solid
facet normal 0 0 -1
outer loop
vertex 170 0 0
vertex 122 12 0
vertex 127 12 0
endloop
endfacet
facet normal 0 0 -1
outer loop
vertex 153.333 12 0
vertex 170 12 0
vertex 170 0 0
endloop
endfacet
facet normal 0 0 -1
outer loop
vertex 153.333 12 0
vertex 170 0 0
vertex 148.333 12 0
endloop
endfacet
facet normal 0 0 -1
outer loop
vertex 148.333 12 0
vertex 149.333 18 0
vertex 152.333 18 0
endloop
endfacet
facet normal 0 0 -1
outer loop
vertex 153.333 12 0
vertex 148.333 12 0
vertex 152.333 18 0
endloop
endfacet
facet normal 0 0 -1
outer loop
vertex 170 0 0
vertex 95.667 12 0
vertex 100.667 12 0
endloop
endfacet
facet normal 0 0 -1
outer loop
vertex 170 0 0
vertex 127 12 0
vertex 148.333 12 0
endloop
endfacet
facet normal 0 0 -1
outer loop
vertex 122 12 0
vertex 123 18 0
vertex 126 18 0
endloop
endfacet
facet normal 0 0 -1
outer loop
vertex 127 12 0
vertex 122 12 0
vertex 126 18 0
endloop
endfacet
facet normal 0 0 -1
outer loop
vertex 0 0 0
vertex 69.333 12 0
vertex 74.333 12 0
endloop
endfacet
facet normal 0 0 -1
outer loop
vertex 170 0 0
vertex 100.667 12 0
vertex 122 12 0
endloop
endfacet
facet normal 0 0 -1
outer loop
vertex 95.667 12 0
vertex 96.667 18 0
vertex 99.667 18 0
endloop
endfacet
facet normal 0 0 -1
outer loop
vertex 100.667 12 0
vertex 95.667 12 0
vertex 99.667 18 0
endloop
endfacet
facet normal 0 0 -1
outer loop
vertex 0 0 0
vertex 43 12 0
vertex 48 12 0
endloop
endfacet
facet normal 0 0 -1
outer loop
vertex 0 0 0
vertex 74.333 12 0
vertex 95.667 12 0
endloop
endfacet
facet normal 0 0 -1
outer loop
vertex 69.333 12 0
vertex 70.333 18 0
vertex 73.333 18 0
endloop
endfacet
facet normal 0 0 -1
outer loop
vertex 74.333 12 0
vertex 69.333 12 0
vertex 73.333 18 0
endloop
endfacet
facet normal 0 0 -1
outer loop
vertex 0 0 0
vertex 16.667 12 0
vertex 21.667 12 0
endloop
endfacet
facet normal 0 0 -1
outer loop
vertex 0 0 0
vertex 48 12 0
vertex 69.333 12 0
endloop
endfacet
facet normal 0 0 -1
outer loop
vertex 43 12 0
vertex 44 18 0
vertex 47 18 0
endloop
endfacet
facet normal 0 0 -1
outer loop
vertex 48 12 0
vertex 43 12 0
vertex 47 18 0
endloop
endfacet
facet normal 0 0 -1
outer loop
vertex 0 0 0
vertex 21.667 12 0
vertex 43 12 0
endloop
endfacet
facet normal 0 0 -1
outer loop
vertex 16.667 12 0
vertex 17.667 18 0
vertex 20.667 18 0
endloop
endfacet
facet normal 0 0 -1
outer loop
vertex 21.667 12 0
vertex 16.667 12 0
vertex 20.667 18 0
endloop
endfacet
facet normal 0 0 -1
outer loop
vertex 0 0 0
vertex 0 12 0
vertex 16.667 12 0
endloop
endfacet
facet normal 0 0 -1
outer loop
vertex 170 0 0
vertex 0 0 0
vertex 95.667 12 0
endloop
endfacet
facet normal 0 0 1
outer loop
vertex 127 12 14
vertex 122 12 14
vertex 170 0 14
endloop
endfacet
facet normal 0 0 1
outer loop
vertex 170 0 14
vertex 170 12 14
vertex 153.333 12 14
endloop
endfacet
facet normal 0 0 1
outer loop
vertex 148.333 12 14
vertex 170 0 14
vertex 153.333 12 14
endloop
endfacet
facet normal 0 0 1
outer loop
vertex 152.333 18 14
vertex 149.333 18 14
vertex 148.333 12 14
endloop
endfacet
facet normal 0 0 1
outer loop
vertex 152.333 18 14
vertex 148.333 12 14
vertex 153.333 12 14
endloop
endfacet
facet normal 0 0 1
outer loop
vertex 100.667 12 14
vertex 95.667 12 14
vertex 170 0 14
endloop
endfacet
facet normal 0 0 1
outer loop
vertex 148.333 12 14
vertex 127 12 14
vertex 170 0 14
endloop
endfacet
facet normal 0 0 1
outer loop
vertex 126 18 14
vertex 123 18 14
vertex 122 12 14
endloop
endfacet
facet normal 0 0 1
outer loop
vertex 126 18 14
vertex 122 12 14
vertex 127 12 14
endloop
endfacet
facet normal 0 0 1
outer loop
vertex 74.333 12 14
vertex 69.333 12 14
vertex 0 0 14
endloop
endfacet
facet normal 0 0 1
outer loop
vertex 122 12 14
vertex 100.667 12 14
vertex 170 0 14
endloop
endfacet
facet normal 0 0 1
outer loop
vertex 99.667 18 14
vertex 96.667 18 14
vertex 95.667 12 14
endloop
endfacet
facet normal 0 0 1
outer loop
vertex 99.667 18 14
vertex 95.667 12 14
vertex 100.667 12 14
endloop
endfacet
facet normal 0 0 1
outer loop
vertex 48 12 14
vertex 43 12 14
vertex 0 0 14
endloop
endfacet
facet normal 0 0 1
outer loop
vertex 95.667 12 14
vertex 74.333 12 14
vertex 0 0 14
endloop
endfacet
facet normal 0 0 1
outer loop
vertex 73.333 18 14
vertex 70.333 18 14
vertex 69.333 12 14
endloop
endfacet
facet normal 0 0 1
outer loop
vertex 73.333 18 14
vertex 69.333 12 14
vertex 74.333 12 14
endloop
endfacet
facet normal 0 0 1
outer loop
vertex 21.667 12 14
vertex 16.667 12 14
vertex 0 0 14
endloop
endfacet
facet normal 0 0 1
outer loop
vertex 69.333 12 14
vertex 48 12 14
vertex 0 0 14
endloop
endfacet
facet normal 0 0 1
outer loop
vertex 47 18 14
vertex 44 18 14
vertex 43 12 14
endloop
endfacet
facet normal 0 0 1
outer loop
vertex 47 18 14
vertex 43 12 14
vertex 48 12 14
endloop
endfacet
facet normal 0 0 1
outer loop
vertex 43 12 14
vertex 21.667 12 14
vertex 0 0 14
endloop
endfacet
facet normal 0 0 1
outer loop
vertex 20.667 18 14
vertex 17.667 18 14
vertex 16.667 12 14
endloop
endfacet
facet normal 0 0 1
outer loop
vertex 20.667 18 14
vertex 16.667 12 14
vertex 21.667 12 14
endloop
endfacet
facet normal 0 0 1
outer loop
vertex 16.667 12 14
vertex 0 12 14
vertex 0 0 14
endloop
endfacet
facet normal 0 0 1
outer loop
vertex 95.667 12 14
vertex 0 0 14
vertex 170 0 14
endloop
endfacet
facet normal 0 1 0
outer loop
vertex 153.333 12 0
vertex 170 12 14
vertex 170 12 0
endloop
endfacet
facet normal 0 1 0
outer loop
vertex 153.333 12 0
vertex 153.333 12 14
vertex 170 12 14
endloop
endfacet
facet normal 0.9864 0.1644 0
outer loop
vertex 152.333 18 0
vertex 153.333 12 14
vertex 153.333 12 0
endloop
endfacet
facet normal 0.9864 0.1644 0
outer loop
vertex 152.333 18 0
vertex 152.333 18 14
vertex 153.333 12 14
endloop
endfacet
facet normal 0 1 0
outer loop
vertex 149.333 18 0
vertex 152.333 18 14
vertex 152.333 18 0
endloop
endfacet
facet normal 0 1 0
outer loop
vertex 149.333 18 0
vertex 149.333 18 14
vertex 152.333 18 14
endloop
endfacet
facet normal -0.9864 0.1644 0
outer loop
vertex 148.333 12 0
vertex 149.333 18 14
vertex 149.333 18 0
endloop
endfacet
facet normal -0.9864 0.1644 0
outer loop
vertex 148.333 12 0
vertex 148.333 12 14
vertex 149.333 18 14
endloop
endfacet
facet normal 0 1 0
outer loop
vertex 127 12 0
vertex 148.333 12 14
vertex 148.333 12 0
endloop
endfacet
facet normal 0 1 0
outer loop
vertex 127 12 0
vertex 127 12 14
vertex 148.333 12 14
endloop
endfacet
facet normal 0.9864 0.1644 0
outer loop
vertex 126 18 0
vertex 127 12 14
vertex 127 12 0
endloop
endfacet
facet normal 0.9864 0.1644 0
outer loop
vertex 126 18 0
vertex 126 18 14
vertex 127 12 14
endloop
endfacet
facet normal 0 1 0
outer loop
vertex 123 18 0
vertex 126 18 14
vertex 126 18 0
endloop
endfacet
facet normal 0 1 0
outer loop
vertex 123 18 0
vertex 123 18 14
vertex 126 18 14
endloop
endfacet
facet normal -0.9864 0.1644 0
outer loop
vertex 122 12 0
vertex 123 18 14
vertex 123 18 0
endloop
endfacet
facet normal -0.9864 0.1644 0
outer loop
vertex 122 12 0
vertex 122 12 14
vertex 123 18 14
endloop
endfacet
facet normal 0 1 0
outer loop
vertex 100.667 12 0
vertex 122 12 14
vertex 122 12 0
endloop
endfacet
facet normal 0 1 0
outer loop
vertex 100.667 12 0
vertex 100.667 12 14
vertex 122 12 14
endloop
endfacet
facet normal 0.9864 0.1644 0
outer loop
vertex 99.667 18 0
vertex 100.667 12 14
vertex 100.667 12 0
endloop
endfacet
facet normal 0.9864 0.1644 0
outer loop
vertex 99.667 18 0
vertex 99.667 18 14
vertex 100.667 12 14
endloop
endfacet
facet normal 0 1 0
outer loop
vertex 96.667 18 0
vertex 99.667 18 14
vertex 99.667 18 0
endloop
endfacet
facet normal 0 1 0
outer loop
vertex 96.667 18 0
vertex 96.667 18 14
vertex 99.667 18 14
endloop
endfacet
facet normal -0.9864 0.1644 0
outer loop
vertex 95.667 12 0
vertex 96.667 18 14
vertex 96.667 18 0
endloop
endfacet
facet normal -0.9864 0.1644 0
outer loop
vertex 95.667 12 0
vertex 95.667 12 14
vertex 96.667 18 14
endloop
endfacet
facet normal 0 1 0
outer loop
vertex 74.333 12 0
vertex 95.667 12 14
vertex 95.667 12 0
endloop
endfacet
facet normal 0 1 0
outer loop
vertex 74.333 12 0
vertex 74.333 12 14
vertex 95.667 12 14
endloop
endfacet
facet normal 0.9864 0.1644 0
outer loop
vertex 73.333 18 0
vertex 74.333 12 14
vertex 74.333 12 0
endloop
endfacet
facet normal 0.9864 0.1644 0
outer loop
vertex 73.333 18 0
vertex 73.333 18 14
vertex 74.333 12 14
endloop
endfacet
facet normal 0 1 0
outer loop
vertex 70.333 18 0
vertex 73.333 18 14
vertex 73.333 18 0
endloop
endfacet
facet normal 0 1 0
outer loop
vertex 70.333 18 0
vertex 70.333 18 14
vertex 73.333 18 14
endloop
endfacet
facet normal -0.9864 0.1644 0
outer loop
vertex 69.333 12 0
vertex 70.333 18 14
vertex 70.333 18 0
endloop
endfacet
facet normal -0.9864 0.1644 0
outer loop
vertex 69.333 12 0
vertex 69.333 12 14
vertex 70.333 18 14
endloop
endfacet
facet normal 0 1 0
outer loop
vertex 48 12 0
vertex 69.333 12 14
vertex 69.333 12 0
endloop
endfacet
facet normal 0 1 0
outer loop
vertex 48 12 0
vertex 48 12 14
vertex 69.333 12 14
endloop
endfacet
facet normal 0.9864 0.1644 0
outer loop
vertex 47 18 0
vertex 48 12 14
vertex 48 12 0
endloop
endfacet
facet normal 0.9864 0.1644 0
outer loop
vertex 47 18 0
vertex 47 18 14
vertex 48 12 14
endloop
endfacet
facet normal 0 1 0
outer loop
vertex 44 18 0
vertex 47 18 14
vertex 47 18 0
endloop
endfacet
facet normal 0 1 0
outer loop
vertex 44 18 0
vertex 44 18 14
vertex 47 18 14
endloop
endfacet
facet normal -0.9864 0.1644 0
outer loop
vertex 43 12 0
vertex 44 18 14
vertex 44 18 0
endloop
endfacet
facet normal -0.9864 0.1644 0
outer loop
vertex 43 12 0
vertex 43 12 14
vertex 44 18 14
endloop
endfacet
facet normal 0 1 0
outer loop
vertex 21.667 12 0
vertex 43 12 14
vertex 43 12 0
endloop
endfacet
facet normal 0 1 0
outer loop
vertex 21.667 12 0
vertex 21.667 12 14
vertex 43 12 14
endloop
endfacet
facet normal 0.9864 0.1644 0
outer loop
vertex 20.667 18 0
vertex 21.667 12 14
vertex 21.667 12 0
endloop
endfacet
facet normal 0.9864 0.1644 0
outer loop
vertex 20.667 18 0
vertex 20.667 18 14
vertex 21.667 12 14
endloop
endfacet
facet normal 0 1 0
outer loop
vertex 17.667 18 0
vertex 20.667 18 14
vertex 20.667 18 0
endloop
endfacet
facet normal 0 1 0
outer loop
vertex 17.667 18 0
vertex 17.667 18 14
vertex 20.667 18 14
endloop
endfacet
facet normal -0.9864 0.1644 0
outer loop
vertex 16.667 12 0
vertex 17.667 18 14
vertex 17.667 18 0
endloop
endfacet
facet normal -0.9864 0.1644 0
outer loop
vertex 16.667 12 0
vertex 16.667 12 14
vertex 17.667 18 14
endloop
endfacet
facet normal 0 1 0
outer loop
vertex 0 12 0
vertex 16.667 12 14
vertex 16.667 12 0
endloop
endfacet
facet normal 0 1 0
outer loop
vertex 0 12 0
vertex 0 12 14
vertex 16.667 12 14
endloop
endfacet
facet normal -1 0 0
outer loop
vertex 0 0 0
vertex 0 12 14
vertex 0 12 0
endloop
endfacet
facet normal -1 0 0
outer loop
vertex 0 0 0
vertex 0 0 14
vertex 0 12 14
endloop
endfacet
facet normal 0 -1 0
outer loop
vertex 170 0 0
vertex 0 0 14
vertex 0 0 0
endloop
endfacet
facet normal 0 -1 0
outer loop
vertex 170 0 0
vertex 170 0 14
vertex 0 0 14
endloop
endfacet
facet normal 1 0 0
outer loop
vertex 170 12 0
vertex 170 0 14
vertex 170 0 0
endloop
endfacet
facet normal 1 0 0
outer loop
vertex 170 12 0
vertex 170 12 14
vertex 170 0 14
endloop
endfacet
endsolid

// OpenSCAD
$fn = 32;

// ----------------------------------------------------------------------
// Gear rack: 6 teeth on a 170 mm bar, pitch 26.33 mm
// ----------------------------------------------------------------------

// --- parameters (mm) ---
profile_height = 14;      // extrusion height
profile_points = 28;      // points of the closed outline

profile = [[0, 0], [170, 0], [170, 12], [153.333, 12], [152.333, 18], [149.333, 18], [148.333, 12], [127, 12], [126, 18], [123, 18], [122, 12], [100.667, 12], [99.667, 18], [96.667, 18], [95.667, 12], [74.333, 12], [73.333, 18], [70.333, 18], [69.333, 12], [48, 12], [47, 18], [44, 18], [43, 12], [21.667, 12], [20.667, 18], [17.667, 18], [16.667, 12], [0, 12]];  // single closed polygon, 28 points, counter clockwise

// --- the one profile operation ---
linear_extrude(height = profile_height) polygon(points = profile);
